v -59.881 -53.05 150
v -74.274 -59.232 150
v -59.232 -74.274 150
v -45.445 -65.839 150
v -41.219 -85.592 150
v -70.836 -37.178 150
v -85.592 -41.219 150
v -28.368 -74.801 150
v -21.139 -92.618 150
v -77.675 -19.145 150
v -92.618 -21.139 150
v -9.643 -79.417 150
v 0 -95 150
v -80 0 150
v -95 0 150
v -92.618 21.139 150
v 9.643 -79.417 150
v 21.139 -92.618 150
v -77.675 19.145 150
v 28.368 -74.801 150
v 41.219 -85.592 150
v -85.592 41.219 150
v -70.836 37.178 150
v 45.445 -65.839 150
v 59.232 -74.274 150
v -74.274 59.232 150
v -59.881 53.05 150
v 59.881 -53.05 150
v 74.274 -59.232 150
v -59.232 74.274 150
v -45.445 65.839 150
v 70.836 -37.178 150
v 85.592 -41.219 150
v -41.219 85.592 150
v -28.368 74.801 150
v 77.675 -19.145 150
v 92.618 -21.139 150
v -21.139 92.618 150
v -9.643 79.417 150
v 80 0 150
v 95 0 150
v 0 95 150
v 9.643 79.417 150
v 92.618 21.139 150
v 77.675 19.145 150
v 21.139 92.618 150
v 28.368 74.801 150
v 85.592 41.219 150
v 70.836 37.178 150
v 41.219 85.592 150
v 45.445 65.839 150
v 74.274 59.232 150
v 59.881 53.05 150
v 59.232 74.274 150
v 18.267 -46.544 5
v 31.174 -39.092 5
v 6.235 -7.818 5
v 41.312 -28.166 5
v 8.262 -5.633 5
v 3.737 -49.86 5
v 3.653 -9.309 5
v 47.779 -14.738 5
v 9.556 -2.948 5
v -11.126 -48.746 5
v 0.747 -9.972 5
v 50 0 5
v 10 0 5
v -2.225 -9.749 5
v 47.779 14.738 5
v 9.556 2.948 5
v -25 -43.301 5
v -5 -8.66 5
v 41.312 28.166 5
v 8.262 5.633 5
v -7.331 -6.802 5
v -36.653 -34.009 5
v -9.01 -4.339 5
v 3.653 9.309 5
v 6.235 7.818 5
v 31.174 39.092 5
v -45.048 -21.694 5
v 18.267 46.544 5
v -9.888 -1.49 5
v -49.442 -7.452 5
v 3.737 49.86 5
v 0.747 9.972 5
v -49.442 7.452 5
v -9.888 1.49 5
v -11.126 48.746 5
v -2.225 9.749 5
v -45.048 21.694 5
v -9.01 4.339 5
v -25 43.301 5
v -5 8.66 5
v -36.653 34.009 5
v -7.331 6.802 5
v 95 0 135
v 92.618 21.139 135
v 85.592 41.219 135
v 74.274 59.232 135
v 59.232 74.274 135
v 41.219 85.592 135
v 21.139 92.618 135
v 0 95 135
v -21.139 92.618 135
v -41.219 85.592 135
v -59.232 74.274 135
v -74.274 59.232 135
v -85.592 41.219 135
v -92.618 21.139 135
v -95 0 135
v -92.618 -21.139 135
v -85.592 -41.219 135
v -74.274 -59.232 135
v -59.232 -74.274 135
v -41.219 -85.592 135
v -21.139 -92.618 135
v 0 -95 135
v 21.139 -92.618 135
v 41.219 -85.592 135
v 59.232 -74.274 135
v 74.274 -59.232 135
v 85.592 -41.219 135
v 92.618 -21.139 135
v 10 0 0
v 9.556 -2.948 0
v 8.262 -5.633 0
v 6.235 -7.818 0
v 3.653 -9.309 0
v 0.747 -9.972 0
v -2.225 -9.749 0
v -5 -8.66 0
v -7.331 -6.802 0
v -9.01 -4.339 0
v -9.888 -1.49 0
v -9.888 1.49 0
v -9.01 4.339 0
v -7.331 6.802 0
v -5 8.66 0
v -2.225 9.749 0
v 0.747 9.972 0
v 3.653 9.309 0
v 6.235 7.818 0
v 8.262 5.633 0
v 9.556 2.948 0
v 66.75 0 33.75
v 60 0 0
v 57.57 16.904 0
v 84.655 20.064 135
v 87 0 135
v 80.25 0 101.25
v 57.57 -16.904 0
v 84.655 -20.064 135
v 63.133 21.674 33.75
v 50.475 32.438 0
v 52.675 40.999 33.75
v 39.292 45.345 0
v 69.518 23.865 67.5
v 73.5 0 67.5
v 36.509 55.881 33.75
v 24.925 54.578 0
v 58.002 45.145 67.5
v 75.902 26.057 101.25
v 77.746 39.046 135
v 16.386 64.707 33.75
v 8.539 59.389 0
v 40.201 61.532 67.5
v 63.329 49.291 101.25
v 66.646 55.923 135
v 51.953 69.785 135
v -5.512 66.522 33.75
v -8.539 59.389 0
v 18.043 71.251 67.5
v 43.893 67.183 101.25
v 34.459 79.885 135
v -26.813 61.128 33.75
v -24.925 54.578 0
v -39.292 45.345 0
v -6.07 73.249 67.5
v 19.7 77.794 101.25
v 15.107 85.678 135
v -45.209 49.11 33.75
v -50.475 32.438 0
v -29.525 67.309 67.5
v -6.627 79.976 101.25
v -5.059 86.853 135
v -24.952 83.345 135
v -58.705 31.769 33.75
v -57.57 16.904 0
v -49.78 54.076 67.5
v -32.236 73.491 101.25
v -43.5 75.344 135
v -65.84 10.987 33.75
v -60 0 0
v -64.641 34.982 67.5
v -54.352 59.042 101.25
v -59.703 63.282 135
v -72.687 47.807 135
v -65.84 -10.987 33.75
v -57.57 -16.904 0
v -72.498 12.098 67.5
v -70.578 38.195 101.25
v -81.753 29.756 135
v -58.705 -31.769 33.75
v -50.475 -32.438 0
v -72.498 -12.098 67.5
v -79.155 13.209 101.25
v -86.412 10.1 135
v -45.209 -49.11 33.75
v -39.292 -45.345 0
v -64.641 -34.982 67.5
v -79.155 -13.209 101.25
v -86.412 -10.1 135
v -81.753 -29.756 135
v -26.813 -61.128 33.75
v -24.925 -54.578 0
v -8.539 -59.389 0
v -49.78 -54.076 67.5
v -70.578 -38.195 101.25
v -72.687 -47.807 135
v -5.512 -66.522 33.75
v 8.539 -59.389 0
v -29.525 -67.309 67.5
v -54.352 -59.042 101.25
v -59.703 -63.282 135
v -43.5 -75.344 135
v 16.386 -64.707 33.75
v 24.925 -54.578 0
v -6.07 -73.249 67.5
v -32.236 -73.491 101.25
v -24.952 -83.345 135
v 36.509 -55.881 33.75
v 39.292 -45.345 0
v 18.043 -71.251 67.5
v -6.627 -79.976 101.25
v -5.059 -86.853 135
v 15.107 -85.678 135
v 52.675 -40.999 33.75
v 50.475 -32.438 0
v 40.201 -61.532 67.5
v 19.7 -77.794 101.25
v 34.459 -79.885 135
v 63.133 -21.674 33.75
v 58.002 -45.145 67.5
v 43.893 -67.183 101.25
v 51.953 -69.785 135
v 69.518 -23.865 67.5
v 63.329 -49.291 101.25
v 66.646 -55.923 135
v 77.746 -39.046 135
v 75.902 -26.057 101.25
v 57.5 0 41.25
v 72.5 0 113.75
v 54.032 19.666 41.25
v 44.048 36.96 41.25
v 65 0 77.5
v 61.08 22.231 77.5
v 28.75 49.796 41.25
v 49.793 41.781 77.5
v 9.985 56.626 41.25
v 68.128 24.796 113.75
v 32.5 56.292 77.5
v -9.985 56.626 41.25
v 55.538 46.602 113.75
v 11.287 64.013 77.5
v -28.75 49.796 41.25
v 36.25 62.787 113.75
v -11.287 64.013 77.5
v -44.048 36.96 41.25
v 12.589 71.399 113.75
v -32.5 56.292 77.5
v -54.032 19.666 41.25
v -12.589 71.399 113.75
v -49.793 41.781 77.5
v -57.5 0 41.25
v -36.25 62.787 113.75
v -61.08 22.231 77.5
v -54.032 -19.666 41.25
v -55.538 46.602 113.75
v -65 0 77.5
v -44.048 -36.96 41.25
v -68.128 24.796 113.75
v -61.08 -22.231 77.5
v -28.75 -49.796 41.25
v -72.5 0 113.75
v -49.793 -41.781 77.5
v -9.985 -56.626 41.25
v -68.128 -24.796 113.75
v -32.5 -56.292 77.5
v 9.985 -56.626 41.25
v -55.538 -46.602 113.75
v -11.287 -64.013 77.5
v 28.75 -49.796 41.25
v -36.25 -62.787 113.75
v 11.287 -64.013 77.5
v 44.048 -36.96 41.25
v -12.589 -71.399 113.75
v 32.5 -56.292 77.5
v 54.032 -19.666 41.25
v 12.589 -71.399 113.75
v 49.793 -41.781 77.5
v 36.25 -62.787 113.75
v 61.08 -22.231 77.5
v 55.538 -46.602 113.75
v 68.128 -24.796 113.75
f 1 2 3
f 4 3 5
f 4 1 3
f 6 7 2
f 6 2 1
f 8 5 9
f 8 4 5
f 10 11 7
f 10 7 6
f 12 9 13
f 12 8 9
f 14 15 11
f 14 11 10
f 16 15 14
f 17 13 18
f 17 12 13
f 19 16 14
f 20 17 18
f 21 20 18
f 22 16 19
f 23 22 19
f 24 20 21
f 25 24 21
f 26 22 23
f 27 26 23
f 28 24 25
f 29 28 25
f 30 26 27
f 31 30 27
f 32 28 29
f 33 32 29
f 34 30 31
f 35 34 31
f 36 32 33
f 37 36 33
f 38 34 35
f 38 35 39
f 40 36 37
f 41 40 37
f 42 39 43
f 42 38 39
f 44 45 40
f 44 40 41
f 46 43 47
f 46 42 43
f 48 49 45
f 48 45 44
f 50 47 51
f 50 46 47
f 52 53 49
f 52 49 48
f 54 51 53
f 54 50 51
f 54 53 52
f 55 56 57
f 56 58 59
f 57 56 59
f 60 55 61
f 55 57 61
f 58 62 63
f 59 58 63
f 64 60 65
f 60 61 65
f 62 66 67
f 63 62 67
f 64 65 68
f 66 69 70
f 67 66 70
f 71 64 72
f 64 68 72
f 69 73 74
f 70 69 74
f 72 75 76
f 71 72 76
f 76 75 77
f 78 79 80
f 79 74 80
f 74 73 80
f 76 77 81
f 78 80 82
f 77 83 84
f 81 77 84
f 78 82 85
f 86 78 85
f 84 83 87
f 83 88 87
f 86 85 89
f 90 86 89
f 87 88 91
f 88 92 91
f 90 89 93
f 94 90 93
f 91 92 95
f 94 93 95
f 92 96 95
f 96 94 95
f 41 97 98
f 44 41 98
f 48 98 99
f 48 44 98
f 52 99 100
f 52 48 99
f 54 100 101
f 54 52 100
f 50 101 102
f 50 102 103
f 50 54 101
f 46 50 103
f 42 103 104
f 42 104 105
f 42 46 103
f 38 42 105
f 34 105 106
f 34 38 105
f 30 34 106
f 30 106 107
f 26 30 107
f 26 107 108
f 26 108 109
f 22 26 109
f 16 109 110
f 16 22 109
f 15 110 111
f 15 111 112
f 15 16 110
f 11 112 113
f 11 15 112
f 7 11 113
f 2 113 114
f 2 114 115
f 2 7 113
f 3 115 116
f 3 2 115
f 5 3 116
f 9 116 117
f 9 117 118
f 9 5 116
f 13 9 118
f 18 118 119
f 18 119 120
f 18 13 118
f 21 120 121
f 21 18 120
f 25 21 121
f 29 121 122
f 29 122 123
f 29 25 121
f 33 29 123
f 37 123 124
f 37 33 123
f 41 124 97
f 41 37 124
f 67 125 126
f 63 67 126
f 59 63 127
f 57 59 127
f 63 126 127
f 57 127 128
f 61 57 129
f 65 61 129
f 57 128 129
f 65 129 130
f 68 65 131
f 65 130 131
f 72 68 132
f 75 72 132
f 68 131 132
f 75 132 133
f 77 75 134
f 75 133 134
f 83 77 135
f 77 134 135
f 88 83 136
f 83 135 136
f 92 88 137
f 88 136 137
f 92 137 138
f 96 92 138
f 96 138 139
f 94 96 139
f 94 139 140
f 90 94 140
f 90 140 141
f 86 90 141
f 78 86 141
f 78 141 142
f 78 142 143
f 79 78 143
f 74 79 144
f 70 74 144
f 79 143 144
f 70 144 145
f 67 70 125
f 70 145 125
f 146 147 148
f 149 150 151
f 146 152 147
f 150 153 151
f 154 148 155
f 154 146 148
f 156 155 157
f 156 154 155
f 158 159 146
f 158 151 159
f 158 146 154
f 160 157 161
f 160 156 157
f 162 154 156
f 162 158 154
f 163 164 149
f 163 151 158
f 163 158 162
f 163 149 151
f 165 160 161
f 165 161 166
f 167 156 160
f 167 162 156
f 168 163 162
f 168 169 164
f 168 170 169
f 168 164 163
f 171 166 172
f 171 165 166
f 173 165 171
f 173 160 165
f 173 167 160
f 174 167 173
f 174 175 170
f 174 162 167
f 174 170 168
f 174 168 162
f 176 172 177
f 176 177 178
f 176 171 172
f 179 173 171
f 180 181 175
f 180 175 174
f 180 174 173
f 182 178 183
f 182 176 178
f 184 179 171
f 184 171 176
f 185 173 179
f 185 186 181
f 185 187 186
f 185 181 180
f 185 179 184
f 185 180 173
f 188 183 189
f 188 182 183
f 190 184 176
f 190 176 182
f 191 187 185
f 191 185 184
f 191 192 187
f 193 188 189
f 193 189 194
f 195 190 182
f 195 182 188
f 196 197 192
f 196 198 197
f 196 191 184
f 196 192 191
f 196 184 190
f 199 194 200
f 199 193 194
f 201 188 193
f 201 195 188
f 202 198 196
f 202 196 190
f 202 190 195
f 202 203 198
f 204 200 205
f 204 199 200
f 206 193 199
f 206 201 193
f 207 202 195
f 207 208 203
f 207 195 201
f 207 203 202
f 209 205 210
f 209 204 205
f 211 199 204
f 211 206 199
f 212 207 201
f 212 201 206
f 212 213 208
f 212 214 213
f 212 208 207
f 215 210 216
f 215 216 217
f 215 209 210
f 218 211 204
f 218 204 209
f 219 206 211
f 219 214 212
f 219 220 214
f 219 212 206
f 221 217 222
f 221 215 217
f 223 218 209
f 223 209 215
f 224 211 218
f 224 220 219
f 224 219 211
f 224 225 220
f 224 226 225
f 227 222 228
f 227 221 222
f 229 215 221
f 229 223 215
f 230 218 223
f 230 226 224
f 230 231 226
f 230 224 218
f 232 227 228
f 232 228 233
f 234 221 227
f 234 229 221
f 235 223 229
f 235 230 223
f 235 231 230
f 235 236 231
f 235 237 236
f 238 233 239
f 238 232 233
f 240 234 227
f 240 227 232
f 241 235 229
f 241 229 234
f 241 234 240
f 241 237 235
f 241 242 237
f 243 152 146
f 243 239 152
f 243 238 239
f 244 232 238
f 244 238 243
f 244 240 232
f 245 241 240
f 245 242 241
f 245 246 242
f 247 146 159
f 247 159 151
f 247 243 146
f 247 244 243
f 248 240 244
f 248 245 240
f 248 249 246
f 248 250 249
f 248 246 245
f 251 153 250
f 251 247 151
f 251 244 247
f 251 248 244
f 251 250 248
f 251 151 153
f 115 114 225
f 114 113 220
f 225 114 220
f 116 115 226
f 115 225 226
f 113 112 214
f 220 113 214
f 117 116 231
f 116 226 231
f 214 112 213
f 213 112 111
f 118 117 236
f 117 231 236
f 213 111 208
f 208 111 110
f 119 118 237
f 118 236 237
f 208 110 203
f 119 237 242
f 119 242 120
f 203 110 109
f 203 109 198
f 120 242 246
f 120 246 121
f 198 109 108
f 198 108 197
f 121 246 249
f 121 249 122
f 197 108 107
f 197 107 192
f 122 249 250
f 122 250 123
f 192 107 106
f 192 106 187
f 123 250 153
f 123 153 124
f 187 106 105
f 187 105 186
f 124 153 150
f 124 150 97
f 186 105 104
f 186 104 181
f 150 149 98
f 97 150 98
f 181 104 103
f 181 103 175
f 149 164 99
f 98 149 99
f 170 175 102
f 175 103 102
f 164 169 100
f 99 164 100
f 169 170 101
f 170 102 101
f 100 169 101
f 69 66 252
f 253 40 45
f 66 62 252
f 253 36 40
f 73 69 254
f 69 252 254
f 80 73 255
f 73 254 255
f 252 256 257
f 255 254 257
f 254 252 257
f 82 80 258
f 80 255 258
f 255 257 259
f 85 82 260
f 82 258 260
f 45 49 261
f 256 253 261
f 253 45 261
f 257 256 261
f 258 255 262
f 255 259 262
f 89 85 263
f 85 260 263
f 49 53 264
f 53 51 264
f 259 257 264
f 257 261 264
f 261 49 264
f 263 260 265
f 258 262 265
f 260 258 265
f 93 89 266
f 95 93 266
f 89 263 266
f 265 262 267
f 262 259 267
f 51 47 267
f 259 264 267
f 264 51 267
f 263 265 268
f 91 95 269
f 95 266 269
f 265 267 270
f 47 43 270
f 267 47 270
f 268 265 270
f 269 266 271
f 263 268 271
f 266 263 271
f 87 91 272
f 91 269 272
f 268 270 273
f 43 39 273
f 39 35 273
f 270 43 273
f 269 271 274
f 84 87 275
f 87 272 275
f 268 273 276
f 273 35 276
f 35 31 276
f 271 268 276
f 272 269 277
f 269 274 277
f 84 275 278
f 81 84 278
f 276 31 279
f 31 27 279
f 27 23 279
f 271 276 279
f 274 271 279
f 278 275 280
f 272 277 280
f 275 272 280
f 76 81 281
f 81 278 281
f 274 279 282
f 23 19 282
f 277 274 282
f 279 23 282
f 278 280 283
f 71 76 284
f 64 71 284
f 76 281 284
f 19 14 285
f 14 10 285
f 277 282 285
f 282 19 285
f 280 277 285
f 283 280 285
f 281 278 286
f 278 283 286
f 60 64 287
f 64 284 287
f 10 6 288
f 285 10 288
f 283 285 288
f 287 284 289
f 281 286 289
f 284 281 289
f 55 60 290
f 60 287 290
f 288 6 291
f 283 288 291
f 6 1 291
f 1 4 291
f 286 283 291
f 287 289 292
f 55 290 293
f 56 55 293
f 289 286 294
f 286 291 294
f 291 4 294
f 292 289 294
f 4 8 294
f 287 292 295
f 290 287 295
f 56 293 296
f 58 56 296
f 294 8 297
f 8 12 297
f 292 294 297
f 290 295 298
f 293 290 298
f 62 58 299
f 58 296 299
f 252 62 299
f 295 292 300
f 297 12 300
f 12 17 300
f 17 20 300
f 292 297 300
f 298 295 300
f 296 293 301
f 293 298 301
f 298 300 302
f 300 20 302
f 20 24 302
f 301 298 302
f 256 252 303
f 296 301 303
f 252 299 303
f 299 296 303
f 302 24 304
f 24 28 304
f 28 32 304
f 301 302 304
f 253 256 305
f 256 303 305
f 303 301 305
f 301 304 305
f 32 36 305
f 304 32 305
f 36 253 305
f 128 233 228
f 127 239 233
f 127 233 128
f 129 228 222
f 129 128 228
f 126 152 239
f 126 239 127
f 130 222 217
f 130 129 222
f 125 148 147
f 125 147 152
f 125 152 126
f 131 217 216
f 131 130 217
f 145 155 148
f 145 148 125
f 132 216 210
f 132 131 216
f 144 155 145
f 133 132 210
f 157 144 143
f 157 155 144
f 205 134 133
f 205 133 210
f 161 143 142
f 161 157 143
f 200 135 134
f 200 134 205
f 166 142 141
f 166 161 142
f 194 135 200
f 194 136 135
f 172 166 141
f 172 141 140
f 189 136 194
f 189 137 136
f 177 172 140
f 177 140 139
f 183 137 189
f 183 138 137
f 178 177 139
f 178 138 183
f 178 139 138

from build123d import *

# Parameters (mm, degrees)
SKETCH_R      = 10
POCKET_DEPTH  = 5
SKETCH001_R   = 95
SKETCH001_R_2 = 82.96172
PAD_DEPTH     = 15


with BuildPart() as kegel001:
    # Cone001 → Cone001 (revolve)
    with BuildSketch(Plane(origin=(0, 0, 5), x_dir=(1, 0, 0), z_dir=(0, -1, 0))):
        Polygon((0, 0), (50, 0), (80, 145), (0, 145), align=None)
    revolve(axis=Axis((0, 0, 5), (0, 0, 1)))


with BuildPart() as pocket:
    # Cone → Cone (revolve)
    with BuildSketch(Plane.XZ):
        Polygon((0, 0), (60, 0), (90, 150), (0, 150), align=None)
    revolve(axis=Axis((0, 0, 0), (0, 0, 1)))

    # Cut: cut Kegel001
    add(kegel001.part, mode=Mode.SUBTRACT)

    # Sketch → Pocket (cut)
    with BuildSketch(Plane(origin=(0, 0, 0), x_dir=(1, 0, 0), z_dir=(0, 0, -1))):
        Circle(SKETCH_R)
    extrude(amount=-POCKET_DEPTH, mode=Mode.SUBTRACT)


with BuildPart() as blumentopf:
    # Sketch001 → Pad (new body)
    with BuildSketch(Plane.XY.offset(150)):
        Circle(SKETCH001_R)
        Circle(SKETCH001_R_2, mode=Mode.SUBTRACT)
    extrude(amount=-PAD_DEPTH)

    # Fusion: union Pocket
    add(pocket.part)


solid = blumentopf.part
